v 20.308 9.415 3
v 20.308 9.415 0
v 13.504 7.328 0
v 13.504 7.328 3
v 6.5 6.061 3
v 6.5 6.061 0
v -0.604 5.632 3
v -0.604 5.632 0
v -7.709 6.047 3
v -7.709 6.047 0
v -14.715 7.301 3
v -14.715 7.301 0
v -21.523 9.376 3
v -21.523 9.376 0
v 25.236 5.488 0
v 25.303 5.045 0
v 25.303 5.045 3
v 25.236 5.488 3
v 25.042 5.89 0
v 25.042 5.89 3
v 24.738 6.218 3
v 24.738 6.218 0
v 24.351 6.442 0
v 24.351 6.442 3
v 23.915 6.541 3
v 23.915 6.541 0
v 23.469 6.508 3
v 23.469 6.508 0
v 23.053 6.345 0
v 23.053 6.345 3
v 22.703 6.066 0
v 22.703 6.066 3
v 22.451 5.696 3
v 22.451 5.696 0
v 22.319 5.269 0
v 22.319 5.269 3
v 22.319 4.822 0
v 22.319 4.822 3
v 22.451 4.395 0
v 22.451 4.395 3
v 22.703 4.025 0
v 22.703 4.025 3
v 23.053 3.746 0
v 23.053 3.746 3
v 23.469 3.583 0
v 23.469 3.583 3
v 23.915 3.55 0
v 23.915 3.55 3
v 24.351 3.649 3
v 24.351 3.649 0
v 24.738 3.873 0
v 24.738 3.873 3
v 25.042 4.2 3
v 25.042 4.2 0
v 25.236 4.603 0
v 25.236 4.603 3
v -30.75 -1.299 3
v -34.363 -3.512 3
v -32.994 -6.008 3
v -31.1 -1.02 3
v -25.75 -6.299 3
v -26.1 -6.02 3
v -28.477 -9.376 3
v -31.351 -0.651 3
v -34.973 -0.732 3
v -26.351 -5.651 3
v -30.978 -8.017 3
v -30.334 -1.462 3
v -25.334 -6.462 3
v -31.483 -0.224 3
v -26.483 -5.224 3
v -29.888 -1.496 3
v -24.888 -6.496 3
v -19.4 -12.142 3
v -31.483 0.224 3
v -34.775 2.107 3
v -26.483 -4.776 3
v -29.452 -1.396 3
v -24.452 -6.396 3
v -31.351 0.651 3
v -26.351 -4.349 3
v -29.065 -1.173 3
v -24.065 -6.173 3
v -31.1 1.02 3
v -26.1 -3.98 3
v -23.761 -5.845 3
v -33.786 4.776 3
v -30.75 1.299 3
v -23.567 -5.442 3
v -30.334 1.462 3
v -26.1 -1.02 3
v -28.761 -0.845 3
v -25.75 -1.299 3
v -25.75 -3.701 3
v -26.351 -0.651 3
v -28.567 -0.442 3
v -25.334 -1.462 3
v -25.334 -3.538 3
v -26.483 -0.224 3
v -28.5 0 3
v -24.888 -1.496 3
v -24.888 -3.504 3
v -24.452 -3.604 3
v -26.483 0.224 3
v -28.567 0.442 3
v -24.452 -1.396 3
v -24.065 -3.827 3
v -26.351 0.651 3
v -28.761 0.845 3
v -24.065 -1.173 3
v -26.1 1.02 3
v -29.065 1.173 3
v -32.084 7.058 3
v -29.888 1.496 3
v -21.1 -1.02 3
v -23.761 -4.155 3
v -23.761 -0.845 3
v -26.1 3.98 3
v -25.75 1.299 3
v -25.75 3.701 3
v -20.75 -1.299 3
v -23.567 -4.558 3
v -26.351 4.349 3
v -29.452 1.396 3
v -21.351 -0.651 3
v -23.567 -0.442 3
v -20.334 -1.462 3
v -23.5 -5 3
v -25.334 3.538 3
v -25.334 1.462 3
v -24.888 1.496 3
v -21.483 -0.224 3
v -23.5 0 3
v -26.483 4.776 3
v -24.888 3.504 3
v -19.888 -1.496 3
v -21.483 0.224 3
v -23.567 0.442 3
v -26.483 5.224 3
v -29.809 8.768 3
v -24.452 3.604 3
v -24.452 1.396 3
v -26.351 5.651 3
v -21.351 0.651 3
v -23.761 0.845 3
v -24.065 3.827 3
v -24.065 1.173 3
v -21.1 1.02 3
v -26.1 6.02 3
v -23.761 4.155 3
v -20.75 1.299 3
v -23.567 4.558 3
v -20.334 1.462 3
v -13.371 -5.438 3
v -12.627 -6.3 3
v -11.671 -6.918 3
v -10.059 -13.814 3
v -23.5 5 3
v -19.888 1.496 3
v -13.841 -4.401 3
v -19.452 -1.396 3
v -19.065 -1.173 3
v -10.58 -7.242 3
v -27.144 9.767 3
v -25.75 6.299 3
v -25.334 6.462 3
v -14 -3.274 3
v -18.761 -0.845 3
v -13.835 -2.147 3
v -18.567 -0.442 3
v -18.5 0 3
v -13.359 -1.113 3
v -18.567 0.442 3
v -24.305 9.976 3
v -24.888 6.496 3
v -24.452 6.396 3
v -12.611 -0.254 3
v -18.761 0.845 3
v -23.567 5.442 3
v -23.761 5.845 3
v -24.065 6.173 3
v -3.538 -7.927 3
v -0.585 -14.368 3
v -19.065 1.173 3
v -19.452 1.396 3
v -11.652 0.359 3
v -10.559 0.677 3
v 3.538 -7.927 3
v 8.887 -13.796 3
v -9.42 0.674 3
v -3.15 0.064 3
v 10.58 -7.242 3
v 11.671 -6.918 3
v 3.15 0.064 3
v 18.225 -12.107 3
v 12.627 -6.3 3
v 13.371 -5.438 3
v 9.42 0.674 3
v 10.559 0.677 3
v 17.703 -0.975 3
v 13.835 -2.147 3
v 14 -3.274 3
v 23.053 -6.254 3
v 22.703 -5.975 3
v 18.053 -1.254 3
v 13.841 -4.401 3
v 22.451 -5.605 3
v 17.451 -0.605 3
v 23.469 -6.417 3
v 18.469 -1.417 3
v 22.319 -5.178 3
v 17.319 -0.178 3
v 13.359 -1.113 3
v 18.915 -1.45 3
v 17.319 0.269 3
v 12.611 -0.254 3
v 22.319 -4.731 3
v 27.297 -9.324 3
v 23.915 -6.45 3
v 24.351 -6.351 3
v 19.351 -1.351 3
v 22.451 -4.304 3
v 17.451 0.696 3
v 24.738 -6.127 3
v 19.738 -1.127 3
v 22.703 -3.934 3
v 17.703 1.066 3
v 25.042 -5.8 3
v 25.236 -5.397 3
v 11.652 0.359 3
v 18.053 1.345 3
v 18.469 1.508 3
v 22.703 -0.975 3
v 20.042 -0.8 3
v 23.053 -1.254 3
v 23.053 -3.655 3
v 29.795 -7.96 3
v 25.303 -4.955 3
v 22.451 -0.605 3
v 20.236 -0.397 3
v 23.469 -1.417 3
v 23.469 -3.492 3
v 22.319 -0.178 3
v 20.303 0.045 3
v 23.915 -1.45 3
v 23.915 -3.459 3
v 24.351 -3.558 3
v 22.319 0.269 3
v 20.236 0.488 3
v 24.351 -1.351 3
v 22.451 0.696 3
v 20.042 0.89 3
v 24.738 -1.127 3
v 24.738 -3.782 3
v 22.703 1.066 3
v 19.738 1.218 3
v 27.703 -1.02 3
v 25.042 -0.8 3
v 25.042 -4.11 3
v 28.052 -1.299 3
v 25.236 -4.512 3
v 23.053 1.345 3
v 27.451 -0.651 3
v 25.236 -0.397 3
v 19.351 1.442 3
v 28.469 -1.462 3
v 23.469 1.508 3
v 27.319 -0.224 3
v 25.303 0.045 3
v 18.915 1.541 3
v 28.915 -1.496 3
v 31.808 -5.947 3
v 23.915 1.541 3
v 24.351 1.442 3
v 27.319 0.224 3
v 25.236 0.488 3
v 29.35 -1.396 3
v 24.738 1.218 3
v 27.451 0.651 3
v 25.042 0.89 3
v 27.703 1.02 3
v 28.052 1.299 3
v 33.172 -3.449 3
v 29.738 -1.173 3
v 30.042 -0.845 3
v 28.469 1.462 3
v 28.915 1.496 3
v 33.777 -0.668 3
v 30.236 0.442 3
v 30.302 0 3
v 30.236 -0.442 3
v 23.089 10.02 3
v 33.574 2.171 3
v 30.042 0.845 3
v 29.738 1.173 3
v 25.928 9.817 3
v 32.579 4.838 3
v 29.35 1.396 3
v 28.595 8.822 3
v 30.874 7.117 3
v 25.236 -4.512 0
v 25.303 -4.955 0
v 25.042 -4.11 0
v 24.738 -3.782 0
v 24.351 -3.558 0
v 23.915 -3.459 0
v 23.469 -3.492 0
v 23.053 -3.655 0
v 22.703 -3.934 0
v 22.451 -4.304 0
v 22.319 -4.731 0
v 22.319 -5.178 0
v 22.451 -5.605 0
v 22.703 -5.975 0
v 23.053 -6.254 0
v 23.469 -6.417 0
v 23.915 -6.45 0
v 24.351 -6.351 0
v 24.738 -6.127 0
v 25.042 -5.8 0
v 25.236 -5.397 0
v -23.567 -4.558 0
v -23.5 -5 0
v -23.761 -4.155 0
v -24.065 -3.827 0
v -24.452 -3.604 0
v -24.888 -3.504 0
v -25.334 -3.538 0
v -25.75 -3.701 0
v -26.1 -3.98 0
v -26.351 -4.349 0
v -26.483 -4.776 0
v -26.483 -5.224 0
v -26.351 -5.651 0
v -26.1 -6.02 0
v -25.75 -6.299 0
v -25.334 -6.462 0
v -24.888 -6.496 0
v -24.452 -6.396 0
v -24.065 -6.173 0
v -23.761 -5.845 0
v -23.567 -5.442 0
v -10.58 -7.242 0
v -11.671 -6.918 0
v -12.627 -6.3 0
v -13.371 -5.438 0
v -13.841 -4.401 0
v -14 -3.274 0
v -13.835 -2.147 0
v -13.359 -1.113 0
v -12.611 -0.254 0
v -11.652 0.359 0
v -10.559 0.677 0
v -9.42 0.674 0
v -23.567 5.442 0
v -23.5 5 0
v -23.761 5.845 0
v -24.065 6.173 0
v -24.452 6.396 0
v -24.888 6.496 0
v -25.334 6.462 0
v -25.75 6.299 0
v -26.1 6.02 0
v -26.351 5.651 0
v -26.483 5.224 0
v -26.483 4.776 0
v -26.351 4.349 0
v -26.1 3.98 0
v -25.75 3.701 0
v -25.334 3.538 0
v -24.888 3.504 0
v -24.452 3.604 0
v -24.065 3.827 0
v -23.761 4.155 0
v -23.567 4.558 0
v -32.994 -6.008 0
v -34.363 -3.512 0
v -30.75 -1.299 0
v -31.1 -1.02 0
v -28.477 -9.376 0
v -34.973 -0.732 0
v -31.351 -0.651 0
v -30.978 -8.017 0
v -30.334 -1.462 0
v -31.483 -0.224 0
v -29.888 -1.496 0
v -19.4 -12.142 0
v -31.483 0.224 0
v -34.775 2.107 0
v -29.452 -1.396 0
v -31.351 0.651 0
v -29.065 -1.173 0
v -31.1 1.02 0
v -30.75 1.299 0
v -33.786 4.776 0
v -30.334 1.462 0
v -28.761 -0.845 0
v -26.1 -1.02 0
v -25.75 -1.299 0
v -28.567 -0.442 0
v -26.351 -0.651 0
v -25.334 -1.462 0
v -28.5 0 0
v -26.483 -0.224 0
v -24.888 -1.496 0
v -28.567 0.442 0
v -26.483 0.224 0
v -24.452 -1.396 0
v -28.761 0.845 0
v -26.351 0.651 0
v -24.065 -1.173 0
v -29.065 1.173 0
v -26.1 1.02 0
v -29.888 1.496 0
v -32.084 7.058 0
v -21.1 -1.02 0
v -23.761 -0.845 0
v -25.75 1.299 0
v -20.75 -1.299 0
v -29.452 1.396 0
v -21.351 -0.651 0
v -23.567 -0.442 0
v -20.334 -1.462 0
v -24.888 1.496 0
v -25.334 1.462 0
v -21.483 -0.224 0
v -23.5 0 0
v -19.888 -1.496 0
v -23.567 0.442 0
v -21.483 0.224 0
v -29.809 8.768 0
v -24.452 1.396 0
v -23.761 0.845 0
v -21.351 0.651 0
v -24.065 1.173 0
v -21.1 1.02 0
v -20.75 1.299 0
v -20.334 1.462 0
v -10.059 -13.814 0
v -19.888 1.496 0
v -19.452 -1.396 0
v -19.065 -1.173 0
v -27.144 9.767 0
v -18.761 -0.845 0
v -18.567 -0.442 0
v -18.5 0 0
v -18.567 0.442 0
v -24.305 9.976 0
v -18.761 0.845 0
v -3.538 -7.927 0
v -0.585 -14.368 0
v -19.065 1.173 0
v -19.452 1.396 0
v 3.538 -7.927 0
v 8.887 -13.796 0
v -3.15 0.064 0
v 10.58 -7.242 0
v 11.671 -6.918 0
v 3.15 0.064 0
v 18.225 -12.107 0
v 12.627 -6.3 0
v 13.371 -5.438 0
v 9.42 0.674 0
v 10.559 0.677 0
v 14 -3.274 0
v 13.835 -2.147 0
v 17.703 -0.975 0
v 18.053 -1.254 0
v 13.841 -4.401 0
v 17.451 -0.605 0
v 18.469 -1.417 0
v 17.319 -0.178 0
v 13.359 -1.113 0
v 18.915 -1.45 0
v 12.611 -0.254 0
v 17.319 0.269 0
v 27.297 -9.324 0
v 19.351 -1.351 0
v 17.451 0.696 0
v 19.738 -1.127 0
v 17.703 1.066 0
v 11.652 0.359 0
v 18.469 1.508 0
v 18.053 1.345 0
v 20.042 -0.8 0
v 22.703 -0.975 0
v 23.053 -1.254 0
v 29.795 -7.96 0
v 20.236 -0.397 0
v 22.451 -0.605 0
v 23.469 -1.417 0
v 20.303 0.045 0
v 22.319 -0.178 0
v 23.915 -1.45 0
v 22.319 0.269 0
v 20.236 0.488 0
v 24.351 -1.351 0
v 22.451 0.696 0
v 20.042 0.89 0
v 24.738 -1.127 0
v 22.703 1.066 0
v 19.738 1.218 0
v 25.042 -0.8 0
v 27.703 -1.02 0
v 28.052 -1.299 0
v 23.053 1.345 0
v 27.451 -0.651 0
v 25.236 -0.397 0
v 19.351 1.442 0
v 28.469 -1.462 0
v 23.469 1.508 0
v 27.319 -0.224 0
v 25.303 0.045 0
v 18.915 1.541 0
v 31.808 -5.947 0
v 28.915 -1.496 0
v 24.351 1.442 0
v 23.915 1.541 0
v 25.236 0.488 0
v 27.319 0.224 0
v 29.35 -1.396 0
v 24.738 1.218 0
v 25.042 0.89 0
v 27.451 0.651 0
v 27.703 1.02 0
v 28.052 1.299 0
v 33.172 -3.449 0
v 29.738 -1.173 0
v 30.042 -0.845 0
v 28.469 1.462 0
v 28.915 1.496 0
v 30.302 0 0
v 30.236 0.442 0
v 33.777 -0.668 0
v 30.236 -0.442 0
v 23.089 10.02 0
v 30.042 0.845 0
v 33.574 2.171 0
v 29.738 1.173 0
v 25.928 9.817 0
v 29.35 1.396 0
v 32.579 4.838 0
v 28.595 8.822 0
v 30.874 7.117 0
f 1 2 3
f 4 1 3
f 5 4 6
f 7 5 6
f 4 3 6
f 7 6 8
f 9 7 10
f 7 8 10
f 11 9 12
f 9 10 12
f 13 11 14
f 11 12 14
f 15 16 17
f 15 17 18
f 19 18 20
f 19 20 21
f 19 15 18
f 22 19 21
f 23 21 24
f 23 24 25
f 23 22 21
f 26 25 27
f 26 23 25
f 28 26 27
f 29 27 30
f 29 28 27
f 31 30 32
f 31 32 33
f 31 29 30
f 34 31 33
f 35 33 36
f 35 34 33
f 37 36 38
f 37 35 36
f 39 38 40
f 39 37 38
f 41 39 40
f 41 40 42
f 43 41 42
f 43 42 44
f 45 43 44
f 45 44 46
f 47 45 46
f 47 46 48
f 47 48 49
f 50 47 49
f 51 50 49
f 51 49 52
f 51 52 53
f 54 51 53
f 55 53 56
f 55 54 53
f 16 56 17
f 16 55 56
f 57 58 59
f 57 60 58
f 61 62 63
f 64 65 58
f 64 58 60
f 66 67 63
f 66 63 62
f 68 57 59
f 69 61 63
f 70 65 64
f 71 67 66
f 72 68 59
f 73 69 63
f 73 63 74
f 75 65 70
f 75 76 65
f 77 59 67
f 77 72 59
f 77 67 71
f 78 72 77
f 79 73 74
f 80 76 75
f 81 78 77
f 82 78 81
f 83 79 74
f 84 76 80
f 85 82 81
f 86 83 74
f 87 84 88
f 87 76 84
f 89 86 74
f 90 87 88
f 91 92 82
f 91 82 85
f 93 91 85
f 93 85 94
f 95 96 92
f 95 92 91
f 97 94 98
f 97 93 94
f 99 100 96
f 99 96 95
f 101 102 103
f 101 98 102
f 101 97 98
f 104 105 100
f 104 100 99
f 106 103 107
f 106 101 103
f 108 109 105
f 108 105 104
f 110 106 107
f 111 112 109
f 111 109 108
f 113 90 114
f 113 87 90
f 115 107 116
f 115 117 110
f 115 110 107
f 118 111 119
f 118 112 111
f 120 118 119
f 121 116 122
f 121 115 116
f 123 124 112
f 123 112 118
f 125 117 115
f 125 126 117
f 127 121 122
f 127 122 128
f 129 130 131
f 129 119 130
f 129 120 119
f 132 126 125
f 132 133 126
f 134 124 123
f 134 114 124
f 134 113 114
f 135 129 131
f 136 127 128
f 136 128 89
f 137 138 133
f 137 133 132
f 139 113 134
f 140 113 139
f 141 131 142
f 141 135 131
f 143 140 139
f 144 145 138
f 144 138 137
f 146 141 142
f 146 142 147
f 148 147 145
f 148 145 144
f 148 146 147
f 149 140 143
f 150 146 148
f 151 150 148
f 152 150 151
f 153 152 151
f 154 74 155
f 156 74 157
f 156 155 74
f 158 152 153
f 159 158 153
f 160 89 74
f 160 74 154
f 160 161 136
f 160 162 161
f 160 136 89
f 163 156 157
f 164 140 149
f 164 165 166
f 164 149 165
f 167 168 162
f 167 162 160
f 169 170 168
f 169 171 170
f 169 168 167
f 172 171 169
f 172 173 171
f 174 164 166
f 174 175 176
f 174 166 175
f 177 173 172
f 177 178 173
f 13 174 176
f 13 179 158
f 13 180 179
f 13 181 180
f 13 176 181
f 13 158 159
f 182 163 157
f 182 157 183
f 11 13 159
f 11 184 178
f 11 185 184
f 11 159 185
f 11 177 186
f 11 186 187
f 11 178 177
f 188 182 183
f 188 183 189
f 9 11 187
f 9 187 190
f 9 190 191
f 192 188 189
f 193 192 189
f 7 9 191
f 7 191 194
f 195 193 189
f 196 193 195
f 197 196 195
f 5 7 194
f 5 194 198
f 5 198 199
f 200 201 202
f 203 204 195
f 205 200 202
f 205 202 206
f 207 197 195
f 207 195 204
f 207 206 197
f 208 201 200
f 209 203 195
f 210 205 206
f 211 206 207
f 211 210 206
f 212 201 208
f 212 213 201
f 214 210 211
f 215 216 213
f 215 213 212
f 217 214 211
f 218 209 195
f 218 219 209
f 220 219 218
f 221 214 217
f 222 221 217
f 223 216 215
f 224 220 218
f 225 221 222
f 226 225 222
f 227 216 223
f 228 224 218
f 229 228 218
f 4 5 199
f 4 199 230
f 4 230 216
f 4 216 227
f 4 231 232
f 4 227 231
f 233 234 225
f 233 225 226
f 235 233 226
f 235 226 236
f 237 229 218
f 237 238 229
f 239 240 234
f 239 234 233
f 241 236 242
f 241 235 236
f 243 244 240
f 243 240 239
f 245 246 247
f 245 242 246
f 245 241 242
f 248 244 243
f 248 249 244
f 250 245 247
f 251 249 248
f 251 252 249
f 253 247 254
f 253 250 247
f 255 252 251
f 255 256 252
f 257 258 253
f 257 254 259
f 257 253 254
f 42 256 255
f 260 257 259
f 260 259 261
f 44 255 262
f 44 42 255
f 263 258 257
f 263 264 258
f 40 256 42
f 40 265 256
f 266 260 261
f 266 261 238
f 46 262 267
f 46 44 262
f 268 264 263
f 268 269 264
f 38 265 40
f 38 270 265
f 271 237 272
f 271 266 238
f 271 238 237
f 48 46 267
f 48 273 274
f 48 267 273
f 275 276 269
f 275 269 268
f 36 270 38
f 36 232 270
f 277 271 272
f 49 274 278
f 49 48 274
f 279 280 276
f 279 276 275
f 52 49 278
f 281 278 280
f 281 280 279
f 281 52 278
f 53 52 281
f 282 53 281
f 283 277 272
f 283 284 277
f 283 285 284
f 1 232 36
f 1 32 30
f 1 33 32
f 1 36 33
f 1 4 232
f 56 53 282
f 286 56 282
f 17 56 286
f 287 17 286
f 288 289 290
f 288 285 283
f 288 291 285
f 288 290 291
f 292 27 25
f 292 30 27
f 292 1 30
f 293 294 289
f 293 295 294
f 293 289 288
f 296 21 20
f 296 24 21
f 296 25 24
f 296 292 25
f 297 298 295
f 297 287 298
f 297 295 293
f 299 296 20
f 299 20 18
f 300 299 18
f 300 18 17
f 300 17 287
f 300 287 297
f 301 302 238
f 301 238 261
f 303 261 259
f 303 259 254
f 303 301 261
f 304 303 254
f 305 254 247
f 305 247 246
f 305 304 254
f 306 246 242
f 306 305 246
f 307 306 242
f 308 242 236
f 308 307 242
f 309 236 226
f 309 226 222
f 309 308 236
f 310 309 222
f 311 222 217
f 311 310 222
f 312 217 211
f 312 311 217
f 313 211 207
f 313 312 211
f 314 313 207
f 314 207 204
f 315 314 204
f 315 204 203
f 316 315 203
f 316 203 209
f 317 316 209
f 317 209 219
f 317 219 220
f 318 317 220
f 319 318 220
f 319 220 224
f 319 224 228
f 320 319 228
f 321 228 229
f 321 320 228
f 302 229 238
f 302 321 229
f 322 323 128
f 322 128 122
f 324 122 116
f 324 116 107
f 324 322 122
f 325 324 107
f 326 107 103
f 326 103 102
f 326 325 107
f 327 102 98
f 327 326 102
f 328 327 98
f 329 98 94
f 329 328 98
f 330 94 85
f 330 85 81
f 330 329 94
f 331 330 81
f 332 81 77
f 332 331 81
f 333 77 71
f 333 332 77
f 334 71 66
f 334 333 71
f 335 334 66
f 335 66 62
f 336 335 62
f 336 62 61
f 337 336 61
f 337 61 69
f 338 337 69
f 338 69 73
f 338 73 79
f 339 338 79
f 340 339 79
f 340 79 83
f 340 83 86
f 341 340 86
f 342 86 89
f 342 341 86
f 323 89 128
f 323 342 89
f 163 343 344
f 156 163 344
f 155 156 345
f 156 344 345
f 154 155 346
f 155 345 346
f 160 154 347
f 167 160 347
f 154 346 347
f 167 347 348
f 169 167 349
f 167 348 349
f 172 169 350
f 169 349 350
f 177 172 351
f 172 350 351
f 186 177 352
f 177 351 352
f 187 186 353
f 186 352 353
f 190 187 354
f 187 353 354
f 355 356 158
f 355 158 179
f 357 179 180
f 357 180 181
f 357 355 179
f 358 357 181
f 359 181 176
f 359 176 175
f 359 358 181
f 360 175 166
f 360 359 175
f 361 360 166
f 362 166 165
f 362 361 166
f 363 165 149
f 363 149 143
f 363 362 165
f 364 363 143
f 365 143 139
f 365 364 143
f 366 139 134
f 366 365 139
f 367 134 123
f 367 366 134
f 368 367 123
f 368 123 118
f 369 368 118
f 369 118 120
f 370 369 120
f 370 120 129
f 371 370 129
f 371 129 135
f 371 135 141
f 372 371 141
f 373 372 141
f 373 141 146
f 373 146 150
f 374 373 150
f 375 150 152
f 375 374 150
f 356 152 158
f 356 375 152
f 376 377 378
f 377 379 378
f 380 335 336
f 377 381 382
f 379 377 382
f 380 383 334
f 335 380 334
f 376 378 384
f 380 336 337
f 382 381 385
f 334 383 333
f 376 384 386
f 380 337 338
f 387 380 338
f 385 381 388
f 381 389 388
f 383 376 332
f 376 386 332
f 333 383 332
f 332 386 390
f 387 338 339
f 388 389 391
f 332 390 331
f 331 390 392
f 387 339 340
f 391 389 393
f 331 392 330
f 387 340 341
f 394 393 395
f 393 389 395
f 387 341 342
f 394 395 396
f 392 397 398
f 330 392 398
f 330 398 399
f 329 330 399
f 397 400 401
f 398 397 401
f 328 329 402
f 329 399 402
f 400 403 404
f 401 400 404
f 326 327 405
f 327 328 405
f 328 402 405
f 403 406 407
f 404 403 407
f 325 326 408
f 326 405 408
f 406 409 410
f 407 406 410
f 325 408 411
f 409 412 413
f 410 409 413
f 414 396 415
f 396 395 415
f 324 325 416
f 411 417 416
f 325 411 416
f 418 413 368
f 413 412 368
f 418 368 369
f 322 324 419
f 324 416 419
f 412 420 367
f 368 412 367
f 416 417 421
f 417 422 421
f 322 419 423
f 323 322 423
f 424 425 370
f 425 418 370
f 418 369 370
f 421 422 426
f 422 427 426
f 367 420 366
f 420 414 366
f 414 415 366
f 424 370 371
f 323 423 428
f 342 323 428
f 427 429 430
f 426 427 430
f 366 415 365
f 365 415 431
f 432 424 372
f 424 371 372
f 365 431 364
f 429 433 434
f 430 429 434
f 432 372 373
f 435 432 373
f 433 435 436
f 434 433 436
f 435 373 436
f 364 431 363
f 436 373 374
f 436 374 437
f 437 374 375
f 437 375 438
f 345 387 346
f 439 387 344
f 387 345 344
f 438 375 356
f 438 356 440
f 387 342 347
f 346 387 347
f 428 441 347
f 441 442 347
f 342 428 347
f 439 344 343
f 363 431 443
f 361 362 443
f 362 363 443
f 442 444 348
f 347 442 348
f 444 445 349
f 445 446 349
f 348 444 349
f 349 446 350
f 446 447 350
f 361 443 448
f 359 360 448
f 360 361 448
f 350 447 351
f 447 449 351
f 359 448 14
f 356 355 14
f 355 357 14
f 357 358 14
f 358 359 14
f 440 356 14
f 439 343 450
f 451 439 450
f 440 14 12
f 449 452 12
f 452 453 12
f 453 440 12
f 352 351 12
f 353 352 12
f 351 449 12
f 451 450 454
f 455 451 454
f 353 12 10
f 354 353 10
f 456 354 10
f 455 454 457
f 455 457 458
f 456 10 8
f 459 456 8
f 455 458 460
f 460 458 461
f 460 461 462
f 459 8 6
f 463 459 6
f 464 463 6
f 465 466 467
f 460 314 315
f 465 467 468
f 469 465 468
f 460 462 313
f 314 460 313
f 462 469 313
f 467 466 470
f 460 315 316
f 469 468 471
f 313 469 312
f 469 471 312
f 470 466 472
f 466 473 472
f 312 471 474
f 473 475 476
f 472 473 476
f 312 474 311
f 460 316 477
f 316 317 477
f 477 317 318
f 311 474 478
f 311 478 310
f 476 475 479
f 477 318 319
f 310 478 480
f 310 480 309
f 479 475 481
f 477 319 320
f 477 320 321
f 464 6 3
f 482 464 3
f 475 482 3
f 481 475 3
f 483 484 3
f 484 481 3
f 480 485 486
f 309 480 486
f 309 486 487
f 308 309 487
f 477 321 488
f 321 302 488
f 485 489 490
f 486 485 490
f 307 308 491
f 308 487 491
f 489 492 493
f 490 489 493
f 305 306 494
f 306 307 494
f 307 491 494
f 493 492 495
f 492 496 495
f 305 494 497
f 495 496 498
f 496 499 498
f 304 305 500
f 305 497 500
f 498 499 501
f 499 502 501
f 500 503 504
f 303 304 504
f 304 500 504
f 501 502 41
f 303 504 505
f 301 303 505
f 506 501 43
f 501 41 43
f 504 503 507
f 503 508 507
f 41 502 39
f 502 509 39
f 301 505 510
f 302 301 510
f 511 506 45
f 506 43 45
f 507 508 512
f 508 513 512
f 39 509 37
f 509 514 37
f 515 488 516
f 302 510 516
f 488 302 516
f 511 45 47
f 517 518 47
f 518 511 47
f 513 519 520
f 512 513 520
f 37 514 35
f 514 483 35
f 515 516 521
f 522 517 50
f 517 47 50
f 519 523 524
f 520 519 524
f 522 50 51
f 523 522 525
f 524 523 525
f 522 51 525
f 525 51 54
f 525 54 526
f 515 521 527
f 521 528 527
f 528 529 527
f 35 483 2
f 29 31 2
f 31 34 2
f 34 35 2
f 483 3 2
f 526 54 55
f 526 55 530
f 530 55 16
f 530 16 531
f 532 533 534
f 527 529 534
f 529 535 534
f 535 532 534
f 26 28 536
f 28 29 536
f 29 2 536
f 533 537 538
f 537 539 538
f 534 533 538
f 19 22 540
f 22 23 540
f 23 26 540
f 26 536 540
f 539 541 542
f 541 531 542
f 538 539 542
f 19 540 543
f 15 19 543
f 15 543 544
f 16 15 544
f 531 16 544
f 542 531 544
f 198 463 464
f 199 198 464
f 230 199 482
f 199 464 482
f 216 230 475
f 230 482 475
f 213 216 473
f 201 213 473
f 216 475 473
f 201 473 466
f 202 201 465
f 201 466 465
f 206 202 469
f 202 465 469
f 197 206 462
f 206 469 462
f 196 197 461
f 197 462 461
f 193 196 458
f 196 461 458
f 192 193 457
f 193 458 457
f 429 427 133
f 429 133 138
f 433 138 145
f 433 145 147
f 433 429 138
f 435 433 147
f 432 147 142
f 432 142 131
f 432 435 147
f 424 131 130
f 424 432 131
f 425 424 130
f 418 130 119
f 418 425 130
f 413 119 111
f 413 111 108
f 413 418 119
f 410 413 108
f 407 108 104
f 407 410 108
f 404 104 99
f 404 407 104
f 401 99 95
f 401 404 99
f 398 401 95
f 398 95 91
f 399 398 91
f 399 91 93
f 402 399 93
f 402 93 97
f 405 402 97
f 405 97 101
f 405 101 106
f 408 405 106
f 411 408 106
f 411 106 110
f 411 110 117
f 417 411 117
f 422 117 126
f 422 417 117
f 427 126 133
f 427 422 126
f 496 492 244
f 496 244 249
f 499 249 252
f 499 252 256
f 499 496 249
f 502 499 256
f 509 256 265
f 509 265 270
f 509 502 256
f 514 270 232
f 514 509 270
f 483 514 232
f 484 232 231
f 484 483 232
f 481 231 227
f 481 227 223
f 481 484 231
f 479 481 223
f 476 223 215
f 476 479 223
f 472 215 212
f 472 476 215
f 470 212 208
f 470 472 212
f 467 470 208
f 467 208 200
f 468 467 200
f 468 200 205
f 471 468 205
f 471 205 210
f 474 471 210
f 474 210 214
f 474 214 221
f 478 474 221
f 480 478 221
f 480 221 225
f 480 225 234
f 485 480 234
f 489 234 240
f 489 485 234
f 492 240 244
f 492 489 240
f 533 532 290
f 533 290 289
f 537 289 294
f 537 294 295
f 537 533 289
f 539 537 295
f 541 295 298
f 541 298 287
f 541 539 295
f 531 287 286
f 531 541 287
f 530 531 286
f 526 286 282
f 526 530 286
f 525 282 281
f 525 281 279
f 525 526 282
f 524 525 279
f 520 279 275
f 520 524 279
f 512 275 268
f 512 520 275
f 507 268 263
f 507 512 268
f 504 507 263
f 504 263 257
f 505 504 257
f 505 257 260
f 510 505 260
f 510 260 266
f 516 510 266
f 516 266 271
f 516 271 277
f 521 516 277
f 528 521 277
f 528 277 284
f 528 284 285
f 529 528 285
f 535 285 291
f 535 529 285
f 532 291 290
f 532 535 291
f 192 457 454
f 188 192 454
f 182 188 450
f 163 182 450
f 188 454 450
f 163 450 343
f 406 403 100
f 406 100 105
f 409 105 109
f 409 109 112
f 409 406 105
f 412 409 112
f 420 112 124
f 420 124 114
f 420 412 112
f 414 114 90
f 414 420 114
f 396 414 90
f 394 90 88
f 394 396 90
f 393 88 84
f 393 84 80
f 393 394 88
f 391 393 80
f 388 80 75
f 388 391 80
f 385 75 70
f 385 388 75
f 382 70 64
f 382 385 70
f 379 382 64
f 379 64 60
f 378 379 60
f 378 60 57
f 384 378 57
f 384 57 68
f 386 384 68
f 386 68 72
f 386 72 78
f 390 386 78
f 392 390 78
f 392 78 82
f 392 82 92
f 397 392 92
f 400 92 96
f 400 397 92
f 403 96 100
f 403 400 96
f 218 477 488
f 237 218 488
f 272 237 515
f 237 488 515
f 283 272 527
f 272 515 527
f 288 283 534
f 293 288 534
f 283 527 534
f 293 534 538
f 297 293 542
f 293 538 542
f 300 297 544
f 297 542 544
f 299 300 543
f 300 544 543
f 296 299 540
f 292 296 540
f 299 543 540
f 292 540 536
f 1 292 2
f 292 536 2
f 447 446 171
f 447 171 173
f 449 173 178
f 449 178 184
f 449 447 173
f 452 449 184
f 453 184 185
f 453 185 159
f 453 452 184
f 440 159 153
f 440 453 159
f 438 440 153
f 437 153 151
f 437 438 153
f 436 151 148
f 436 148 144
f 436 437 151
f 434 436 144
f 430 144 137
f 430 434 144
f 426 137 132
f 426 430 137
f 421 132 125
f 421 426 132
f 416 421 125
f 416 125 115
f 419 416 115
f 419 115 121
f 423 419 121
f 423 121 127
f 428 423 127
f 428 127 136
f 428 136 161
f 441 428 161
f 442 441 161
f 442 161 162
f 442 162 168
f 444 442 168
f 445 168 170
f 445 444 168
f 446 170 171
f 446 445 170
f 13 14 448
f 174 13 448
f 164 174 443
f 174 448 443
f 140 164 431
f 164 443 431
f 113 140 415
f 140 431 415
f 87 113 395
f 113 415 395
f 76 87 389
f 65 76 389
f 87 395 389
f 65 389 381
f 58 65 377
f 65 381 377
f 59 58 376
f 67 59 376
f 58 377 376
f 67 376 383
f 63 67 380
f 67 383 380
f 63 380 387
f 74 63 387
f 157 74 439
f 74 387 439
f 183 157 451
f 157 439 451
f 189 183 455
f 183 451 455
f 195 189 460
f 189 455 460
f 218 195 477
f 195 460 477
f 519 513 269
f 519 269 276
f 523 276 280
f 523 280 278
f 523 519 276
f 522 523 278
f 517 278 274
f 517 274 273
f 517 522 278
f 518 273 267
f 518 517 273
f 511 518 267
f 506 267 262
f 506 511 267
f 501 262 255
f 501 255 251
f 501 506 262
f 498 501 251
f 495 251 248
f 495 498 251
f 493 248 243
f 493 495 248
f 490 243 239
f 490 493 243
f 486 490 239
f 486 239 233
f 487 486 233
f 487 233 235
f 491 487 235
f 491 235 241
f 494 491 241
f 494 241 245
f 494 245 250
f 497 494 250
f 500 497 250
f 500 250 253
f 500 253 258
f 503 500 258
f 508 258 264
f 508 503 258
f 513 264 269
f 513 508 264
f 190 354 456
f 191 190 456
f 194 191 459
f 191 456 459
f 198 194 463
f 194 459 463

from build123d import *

# Parameters (mm, degrees)
IZIM3_R                     = 1.5
Y_KSEKLIK_EKSTR_ZYON1_DEPTH = 3


with BuildPart() as part:
    # Çizim3 → Yükseklik-Ekstrüzyon1 (new body)
    with BuildSketch(Plane.XY):
        with BuildLine():
            ThreePointArc((-21.522830549, 9.375995553), (-34.375995553, 3.477169451), (-28.477169451, -9.375995553))
            ThreePointArc((-28.477169451, -9.375995553), (-0.585261649, -14.367996391), (27.297293596, -9.324019171))
            ThreePointArc((27.297293596, -9.324019171), (33.172153672, 3.540117765), (20.308016736, 9.41497784))
            ThreePointArc((20.308016736, 9.41497784), (-0.603899698, 5.631994925), (-21.522830549, 9.375995553))
        make_face()
        with Locations((-25, 0)):
            Circle(IZIM3_R, mode=Mode.SUBTRACT)
        with Locations((-25, 5)):
            Circle(IZIM3_R, mode=Mode.SUBTRACT)
        with Locations((-30, 0)):
            Circle(IZIM3_R, mode=Mode.SUBTRACT)
        with Locations((-20, 0)):
            Circle(IZIM3_R, mode=Mode.SUBTRACT)
        with Locations((-25, -5)):
            Circle(IZIM3_R, mode=Mode.SUBTRACT)
        with Locations((23.802655166, 0.045479334)):
            Circle(IZIM3_R, mode=Mode.SUBTRACT)
        with Locations((23.802655166, 5.045479334)):
            Circle(IZIM3_R, mode=Mode.SUBTRACT)
        with Locations((28.802448325, 0)):
            Circle(IZIM3_R, mode=Mode.SUBTRACT)
        with Locations((18.802655166, 0.045479334)):
            Circle(IZIM3_R, mode=Mode.SUBTRACT)
        with Locations((23.802655166, -4.954520666)):
            Circle(IZIM3_R, mode=Mode.SUBTRACT)
        with BuildLine():
            ThreePointArc((-9.420289855, 0.673684705), (0, -0.012567627), (9.420289855, 0.673684705))
            ThreePointArc((9.420289855, 0.673684705), (13.957769087, -2.704374237), (10.579710145, -7.241853469))
            ThreePointArc((10.579710145, -7.241853469), (0, -8.012567627), (-10.579710145, -7.241853469))
            ThreePointArc((-10.579710145, -7.241853469), (-13.957769087, -2.704374237), (-9.420289855, 0.673684705))
        make_face(mode=Mode.SUBTRACT)
    extrude(amount=Y_KSEKLIK_EKSTR_ZYON1_DEPTH)


solid = part.part
